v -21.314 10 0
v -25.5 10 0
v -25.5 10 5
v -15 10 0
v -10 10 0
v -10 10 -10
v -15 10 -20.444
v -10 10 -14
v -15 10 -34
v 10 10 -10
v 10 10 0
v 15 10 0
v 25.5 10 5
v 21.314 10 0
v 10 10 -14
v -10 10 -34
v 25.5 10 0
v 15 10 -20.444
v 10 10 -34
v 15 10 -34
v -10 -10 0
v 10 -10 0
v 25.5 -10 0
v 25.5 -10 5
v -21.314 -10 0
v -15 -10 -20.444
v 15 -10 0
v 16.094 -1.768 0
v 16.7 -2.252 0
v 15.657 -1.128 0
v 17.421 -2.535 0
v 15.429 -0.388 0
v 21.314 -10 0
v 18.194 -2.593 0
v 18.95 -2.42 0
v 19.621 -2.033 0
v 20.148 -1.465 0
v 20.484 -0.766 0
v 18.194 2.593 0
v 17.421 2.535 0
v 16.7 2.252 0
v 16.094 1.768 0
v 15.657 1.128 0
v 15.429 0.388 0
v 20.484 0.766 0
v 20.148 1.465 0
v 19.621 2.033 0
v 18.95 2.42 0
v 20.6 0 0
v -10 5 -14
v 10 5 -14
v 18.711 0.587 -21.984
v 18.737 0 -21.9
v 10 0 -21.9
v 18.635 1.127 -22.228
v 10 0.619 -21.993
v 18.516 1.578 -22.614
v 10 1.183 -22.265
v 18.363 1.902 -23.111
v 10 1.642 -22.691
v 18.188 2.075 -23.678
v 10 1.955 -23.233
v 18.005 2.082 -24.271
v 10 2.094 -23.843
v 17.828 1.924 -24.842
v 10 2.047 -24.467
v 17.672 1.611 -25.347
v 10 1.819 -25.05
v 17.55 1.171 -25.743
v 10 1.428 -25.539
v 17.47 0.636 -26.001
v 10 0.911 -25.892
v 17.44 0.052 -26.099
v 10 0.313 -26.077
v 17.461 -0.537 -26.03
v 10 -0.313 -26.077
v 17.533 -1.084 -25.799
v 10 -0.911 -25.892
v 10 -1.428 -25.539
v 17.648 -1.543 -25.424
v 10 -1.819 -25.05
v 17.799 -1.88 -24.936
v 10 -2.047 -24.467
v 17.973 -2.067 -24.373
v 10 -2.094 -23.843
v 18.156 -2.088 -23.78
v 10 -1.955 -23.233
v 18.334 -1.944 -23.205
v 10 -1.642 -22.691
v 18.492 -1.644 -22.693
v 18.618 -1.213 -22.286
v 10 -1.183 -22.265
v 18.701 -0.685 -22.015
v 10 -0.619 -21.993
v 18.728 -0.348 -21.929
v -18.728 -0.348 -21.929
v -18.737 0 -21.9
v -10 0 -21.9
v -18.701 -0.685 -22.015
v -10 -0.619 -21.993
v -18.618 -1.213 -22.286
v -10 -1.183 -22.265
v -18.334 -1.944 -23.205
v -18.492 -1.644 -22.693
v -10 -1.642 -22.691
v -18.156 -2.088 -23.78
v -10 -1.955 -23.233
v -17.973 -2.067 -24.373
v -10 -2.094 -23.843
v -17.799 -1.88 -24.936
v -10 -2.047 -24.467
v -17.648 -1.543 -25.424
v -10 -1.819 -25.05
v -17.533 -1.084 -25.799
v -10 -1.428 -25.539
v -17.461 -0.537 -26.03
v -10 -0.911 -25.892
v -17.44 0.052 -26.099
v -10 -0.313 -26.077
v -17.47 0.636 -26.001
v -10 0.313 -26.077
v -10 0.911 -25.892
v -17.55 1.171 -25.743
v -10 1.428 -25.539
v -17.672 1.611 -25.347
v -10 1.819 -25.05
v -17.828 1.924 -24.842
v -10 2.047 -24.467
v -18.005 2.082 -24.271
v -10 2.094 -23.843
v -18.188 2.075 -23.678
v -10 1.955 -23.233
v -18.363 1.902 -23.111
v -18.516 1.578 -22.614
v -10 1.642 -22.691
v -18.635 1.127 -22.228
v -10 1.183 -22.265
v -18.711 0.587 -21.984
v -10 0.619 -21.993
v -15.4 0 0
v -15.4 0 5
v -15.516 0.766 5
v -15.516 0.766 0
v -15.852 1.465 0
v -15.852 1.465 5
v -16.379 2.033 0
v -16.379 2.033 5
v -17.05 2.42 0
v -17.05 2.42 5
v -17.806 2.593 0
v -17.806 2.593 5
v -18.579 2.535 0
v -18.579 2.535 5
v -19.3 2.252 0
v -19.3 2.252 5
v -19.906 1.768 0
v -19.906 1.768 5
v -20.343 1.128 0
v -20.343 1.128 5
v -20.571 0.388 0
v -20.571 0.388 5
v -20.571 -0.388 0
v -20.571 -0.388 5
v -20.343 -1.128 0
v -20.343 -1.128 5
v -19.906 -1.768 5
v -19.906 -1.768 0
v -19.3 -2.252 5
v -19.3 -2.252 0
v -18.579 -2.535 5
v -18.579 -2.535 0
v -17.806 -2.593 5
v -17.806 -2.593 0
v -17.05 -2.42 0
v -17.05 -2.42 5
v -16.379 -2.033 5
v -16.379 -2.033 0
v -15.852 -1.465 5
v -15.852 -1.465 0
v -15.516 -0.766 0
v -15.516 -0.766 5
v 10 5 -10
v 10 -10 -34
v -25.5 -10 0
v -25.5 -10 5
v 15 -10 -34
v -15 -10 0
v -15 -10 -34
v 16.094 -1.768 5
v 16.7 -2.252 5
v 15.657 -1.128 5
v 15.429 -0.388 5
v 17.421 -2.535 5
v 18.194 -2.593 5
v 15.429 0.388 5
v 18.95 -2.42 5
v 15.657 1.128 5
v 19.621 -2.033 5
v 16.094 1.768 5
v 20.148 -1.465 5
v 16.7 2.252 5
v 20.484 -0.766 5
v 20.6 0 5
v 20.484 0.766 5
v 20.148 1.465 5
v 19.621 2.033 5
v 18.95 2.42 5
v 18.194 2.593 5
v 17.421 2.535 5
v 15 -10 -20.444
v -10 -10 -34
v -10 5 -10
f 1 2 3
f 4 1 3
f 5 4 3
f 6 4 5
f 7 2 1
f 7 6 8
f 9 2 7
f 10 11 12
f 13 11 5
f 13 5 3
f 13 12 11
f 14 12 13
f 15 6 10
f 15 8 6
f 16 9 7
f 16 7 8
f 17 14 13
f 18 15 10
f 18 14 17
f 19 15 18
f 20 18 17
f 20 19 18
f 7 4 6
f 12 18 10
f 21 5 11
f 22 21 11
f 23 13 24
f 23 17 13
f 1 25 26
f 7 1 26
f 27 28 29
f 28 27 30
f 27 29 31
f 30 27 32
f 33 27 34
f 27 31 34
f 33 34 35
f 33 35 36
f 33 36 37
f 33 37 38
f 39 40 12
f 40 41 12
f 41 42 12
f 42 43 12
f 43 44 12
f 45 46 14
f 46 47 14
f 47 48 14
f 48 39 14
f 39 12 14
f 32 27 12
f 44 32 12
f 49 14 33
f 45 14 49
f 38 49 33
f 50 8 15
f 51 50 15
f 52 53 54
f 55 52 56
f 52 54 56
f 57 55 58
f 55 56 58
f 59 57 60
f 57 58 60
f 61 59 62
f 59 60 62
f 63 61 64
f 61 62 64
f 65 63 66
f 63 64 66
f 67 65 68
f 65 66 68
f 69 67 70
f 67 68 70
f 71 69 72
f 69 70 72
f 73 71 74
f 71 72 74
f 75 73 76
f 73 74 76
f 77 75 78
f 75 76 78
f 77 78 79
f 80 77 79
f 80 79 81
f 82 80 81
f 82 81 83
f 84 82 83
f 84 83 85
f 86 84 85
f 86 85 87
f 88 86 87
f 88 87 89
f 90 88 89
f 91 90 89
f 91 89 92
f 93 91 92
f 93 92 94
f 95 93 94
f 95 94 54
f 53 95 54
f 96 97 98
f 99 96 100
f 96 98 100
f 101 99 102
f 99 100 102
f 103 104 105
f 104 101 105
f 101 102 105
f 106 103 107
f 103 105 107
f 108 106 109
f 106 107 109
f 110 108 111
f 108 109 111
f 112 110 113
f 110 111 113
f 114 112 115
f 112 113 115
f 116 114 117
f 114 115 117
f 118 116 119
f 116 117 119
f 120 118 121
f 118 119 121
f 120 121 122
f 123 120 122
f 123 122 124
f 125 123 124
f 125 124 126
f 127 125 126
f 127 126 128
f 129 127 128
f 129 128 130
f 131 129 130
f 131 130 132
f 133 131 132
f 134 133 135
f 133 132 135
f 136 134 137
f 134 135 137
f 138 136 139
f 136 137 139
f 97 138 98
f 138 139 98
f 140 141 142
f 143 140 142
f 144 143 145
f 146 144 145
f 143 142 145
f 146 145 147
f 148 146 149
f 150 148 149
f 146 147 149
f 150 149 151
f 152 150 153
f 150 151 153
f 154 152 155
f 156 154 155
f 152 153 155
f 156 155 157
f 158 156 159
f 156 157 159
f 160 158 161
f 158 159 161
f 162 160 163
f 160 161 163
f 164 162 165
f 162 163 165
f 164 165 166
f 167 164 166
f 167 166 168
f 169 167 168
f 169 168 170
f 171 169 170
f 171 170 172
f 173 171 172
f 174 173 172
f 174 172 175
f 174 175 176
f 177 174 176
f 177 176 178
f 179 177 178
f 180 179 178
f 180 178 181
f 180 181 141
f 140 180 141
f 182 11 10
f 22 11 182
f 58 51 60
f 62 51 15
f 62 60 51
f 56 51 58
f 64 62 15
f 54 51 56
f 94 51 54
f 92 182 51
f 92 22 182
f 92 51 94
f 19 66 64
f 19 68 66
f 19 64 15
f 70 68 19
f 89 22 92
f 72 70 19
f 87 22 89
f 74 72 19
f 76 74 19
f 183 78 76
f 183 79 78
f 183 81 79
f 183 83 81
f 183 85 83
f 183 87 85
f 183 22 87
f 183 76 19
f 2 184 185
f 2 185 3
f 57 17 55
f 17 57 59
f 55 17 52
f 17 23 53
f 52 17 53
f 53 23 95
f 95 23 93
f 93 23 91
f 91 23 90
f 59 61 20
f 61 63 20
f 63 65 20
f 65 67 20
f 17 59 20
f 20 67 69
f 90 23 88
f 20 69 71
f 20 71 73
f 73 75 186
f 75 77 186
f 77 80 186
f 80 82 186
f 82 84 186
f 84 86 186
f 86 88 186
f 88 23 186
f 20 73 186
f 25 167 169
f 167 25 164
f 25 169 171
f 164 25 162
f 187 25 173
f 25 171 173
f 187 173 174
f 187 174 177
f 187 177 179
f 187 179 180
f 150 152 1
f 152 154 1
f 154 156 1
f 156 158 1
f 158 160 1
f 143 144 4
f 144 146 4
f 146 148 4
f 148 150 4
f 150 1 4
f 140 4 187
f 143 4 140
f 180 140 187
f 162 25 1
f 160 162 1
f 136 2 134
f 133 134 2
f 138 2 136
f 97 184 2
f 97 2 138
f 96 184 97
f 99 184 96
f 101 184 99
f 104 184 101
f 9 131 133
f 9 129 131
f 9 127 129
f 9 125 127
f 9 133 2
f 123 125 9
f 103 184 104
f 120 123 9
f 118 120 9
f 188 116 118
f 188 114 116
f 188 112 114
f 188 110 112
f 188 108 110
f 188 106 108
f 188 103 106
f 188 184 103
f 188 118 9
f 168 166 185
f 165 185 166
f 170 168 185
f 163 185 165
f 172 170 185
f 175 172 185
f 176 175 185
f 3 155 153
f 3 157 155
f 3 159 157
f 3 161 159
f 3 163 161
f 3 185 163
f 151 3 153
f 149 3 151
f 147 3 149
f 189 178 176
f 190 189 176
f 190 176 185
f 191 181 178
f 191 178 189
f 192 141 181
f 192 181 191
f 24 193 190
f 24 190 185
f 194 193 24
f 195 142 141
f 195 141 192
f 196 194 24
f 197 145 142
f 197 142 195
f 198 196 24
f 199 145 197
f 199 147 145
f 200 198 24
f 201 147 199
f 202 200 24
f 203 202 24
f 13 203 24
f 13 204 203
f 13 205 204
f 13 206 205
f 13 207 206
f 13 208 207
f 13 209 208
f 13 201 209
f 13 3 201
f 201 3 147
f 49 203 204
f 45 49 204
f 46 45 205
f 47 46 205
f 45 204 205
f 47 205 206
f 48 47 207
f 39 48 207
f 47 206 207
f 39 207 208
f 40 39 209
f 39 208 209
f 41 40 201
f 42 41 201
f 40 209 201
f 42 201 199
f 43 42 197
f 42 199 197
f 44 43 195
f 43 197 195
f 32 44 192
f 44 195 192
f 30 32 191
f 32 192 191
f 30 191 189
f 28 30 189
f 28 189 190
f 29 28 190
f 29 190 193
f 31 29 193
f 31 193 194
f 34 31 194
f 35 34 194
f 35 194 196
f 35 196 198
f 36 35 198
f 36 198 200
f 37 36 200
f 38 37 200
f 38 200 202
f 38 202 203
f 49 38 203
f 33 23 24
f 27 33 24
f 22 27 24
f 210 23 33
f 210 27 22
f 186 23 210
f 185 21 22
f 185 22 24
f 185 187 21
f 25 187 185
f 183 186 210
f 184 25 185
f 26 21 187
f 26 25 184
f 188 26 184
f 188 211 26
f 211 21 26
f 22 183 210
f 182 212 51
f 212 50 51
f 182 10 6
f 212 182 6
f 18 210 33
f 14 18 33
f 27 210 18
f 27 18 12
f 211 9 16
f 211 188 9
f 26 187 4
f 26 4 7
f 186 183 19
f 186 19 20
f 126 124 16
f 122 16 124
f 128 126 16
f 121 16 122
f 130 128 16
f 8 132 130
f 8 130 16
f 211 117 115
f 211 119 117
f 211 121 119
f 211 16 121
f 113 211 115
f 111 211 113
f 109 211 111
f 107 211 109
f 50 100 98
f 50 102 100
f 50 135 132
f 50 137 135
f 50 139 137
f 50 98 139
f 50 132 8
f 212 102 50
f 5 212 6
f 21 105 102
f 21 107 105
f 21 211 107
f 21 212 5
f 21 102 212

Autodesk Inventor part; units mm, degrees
ref_plane "YZ Plane" through (0, 0, 0) normal (1, 0, 0) x (0, 1, 0)
ref_plane "XZ Plane" through (0, 0, 0) normal (0, 1, 0) x (-1, 0, 0)
ref_plane "XY Plane" through (0, 0, 0) normal (0, 0, 1) x (1, 0, 0)
sketch "Sketch1" plane through (0, 0, 0) normal (0, 0, 1) x (1, 0, 0)
  line L0 (-25.5, 10) -> (25.5, 10)
  line L1 (25.5, 10) -> (25.5, -10)
  line L2 (25.5, -10) -> (-25.5, -10)
  line L3 (-25.5, -10) -> (-25.5, 10)
  point P0 (0, 0)
  point P1 (0, 10)
  point P2 (25.5, 0)
  dimension "d0" = 51
  dimension "d1" = 20
extrude "Extrusion1" add sketch "Sketch1" along normal blind 5
sketch "Sketch2" plane through (-25.5, -10, 0) normal (0, -1, 0) x (1, 0, 0)
  line L0 (0, 0) -> (51, 0) projected
  line L1 (10.5, 0) -> (10.5, -34)
  line L2 (10.5, -34) -> (15.5, -34)
  line L3 (15.5, -34) -> (15.5, 0)
  line L4 (35.5, 0) -> (35.5, -34)
  line L5 (35.5, -34) -> (40.5, -34)
  line L6 (40.5, -34) -> (40.5, 0)
  line L7 (15.5, -34) -> (35.5, -34) construction
  line L8 (0, 0) -> (10.5, -34)
  line L9 (4.1864, 0) -> (10.5, -20.444)
  line L10 (51, 0) -> (40.5, -34)
  line L11 (40.5, -20.444) -> (46.8136, 0)
  point P0 (25.5, 0)
  point P1 (25.5, 0)
  point P2 (25.5, -34)
  dimension "d4" = 20
  dimension "d5" = 5
  dimension "d6" = 5
  dimension "d7" = 34
  dimension "d8" = 4
  dimension "d9" = 4
extrude "Extrusion2" add sketch "Sketch2" against normal up to surface (20 mm away) contours L0 L6 L5 L4 | L0 L9 L1 L8 | L1 L0 L3 L2 | L0 L10 L6 L11
sketch "Sketch3" plane through (10, -10, -34) normal (-1, 0, 0) x (0, 0, 1)
  circle A0 centre (10, 10) radius 2.1
  line L0 (0, 0) -> (0, 20) projected
  point P0 (34, 10)
  point P1 (0, 10)
  dimension "d12" = 4.2
  dimension "d13" = 10
extrude "Extrusion3" cut sketch "Sketch3" along normal blind 40 and the other way blind 40
sketch "Sketch4" plane through (-25.5, 10, 5) normal (0, 1, 0) x (1, 0, 0)
  line L0 (35.5, 15) -> (15.5, 15)
  line L1 (15.5, 15) -> (15.5, 19)
  line L2 (15.5, 19) -> (35.5, 19)
  line L3 (35.5, 19) -> (35.5, 15)
  line L4 (10.5, 39) -> (15.5, 39) projected
  point P0 (25.5, 5)
  point P1 (35.5, 5)
  point P2 (15.5, 5)
  dimension "d18" = 20
  dimension "d19" = 4
extrude "Extrusion4" add sketch "Sketch4" against normal blind 5
sketch "Sketch6" plane through (0, 0, 5) normal (0, 0, 1) x (1, 0, 0)
  circle A0 centre (18, 0) radius 2.6
  circle A1 centre (-18, 0) radius 2.6
  point P0 (0, 0)
  dimension "d25" = 5.2
  dimension "d26" = 18
  dimension "d27" = 18
extrude "Extrusion6" cut sketch "Sketch6" against normal blind 5
properties part number "GT2_Holder"
